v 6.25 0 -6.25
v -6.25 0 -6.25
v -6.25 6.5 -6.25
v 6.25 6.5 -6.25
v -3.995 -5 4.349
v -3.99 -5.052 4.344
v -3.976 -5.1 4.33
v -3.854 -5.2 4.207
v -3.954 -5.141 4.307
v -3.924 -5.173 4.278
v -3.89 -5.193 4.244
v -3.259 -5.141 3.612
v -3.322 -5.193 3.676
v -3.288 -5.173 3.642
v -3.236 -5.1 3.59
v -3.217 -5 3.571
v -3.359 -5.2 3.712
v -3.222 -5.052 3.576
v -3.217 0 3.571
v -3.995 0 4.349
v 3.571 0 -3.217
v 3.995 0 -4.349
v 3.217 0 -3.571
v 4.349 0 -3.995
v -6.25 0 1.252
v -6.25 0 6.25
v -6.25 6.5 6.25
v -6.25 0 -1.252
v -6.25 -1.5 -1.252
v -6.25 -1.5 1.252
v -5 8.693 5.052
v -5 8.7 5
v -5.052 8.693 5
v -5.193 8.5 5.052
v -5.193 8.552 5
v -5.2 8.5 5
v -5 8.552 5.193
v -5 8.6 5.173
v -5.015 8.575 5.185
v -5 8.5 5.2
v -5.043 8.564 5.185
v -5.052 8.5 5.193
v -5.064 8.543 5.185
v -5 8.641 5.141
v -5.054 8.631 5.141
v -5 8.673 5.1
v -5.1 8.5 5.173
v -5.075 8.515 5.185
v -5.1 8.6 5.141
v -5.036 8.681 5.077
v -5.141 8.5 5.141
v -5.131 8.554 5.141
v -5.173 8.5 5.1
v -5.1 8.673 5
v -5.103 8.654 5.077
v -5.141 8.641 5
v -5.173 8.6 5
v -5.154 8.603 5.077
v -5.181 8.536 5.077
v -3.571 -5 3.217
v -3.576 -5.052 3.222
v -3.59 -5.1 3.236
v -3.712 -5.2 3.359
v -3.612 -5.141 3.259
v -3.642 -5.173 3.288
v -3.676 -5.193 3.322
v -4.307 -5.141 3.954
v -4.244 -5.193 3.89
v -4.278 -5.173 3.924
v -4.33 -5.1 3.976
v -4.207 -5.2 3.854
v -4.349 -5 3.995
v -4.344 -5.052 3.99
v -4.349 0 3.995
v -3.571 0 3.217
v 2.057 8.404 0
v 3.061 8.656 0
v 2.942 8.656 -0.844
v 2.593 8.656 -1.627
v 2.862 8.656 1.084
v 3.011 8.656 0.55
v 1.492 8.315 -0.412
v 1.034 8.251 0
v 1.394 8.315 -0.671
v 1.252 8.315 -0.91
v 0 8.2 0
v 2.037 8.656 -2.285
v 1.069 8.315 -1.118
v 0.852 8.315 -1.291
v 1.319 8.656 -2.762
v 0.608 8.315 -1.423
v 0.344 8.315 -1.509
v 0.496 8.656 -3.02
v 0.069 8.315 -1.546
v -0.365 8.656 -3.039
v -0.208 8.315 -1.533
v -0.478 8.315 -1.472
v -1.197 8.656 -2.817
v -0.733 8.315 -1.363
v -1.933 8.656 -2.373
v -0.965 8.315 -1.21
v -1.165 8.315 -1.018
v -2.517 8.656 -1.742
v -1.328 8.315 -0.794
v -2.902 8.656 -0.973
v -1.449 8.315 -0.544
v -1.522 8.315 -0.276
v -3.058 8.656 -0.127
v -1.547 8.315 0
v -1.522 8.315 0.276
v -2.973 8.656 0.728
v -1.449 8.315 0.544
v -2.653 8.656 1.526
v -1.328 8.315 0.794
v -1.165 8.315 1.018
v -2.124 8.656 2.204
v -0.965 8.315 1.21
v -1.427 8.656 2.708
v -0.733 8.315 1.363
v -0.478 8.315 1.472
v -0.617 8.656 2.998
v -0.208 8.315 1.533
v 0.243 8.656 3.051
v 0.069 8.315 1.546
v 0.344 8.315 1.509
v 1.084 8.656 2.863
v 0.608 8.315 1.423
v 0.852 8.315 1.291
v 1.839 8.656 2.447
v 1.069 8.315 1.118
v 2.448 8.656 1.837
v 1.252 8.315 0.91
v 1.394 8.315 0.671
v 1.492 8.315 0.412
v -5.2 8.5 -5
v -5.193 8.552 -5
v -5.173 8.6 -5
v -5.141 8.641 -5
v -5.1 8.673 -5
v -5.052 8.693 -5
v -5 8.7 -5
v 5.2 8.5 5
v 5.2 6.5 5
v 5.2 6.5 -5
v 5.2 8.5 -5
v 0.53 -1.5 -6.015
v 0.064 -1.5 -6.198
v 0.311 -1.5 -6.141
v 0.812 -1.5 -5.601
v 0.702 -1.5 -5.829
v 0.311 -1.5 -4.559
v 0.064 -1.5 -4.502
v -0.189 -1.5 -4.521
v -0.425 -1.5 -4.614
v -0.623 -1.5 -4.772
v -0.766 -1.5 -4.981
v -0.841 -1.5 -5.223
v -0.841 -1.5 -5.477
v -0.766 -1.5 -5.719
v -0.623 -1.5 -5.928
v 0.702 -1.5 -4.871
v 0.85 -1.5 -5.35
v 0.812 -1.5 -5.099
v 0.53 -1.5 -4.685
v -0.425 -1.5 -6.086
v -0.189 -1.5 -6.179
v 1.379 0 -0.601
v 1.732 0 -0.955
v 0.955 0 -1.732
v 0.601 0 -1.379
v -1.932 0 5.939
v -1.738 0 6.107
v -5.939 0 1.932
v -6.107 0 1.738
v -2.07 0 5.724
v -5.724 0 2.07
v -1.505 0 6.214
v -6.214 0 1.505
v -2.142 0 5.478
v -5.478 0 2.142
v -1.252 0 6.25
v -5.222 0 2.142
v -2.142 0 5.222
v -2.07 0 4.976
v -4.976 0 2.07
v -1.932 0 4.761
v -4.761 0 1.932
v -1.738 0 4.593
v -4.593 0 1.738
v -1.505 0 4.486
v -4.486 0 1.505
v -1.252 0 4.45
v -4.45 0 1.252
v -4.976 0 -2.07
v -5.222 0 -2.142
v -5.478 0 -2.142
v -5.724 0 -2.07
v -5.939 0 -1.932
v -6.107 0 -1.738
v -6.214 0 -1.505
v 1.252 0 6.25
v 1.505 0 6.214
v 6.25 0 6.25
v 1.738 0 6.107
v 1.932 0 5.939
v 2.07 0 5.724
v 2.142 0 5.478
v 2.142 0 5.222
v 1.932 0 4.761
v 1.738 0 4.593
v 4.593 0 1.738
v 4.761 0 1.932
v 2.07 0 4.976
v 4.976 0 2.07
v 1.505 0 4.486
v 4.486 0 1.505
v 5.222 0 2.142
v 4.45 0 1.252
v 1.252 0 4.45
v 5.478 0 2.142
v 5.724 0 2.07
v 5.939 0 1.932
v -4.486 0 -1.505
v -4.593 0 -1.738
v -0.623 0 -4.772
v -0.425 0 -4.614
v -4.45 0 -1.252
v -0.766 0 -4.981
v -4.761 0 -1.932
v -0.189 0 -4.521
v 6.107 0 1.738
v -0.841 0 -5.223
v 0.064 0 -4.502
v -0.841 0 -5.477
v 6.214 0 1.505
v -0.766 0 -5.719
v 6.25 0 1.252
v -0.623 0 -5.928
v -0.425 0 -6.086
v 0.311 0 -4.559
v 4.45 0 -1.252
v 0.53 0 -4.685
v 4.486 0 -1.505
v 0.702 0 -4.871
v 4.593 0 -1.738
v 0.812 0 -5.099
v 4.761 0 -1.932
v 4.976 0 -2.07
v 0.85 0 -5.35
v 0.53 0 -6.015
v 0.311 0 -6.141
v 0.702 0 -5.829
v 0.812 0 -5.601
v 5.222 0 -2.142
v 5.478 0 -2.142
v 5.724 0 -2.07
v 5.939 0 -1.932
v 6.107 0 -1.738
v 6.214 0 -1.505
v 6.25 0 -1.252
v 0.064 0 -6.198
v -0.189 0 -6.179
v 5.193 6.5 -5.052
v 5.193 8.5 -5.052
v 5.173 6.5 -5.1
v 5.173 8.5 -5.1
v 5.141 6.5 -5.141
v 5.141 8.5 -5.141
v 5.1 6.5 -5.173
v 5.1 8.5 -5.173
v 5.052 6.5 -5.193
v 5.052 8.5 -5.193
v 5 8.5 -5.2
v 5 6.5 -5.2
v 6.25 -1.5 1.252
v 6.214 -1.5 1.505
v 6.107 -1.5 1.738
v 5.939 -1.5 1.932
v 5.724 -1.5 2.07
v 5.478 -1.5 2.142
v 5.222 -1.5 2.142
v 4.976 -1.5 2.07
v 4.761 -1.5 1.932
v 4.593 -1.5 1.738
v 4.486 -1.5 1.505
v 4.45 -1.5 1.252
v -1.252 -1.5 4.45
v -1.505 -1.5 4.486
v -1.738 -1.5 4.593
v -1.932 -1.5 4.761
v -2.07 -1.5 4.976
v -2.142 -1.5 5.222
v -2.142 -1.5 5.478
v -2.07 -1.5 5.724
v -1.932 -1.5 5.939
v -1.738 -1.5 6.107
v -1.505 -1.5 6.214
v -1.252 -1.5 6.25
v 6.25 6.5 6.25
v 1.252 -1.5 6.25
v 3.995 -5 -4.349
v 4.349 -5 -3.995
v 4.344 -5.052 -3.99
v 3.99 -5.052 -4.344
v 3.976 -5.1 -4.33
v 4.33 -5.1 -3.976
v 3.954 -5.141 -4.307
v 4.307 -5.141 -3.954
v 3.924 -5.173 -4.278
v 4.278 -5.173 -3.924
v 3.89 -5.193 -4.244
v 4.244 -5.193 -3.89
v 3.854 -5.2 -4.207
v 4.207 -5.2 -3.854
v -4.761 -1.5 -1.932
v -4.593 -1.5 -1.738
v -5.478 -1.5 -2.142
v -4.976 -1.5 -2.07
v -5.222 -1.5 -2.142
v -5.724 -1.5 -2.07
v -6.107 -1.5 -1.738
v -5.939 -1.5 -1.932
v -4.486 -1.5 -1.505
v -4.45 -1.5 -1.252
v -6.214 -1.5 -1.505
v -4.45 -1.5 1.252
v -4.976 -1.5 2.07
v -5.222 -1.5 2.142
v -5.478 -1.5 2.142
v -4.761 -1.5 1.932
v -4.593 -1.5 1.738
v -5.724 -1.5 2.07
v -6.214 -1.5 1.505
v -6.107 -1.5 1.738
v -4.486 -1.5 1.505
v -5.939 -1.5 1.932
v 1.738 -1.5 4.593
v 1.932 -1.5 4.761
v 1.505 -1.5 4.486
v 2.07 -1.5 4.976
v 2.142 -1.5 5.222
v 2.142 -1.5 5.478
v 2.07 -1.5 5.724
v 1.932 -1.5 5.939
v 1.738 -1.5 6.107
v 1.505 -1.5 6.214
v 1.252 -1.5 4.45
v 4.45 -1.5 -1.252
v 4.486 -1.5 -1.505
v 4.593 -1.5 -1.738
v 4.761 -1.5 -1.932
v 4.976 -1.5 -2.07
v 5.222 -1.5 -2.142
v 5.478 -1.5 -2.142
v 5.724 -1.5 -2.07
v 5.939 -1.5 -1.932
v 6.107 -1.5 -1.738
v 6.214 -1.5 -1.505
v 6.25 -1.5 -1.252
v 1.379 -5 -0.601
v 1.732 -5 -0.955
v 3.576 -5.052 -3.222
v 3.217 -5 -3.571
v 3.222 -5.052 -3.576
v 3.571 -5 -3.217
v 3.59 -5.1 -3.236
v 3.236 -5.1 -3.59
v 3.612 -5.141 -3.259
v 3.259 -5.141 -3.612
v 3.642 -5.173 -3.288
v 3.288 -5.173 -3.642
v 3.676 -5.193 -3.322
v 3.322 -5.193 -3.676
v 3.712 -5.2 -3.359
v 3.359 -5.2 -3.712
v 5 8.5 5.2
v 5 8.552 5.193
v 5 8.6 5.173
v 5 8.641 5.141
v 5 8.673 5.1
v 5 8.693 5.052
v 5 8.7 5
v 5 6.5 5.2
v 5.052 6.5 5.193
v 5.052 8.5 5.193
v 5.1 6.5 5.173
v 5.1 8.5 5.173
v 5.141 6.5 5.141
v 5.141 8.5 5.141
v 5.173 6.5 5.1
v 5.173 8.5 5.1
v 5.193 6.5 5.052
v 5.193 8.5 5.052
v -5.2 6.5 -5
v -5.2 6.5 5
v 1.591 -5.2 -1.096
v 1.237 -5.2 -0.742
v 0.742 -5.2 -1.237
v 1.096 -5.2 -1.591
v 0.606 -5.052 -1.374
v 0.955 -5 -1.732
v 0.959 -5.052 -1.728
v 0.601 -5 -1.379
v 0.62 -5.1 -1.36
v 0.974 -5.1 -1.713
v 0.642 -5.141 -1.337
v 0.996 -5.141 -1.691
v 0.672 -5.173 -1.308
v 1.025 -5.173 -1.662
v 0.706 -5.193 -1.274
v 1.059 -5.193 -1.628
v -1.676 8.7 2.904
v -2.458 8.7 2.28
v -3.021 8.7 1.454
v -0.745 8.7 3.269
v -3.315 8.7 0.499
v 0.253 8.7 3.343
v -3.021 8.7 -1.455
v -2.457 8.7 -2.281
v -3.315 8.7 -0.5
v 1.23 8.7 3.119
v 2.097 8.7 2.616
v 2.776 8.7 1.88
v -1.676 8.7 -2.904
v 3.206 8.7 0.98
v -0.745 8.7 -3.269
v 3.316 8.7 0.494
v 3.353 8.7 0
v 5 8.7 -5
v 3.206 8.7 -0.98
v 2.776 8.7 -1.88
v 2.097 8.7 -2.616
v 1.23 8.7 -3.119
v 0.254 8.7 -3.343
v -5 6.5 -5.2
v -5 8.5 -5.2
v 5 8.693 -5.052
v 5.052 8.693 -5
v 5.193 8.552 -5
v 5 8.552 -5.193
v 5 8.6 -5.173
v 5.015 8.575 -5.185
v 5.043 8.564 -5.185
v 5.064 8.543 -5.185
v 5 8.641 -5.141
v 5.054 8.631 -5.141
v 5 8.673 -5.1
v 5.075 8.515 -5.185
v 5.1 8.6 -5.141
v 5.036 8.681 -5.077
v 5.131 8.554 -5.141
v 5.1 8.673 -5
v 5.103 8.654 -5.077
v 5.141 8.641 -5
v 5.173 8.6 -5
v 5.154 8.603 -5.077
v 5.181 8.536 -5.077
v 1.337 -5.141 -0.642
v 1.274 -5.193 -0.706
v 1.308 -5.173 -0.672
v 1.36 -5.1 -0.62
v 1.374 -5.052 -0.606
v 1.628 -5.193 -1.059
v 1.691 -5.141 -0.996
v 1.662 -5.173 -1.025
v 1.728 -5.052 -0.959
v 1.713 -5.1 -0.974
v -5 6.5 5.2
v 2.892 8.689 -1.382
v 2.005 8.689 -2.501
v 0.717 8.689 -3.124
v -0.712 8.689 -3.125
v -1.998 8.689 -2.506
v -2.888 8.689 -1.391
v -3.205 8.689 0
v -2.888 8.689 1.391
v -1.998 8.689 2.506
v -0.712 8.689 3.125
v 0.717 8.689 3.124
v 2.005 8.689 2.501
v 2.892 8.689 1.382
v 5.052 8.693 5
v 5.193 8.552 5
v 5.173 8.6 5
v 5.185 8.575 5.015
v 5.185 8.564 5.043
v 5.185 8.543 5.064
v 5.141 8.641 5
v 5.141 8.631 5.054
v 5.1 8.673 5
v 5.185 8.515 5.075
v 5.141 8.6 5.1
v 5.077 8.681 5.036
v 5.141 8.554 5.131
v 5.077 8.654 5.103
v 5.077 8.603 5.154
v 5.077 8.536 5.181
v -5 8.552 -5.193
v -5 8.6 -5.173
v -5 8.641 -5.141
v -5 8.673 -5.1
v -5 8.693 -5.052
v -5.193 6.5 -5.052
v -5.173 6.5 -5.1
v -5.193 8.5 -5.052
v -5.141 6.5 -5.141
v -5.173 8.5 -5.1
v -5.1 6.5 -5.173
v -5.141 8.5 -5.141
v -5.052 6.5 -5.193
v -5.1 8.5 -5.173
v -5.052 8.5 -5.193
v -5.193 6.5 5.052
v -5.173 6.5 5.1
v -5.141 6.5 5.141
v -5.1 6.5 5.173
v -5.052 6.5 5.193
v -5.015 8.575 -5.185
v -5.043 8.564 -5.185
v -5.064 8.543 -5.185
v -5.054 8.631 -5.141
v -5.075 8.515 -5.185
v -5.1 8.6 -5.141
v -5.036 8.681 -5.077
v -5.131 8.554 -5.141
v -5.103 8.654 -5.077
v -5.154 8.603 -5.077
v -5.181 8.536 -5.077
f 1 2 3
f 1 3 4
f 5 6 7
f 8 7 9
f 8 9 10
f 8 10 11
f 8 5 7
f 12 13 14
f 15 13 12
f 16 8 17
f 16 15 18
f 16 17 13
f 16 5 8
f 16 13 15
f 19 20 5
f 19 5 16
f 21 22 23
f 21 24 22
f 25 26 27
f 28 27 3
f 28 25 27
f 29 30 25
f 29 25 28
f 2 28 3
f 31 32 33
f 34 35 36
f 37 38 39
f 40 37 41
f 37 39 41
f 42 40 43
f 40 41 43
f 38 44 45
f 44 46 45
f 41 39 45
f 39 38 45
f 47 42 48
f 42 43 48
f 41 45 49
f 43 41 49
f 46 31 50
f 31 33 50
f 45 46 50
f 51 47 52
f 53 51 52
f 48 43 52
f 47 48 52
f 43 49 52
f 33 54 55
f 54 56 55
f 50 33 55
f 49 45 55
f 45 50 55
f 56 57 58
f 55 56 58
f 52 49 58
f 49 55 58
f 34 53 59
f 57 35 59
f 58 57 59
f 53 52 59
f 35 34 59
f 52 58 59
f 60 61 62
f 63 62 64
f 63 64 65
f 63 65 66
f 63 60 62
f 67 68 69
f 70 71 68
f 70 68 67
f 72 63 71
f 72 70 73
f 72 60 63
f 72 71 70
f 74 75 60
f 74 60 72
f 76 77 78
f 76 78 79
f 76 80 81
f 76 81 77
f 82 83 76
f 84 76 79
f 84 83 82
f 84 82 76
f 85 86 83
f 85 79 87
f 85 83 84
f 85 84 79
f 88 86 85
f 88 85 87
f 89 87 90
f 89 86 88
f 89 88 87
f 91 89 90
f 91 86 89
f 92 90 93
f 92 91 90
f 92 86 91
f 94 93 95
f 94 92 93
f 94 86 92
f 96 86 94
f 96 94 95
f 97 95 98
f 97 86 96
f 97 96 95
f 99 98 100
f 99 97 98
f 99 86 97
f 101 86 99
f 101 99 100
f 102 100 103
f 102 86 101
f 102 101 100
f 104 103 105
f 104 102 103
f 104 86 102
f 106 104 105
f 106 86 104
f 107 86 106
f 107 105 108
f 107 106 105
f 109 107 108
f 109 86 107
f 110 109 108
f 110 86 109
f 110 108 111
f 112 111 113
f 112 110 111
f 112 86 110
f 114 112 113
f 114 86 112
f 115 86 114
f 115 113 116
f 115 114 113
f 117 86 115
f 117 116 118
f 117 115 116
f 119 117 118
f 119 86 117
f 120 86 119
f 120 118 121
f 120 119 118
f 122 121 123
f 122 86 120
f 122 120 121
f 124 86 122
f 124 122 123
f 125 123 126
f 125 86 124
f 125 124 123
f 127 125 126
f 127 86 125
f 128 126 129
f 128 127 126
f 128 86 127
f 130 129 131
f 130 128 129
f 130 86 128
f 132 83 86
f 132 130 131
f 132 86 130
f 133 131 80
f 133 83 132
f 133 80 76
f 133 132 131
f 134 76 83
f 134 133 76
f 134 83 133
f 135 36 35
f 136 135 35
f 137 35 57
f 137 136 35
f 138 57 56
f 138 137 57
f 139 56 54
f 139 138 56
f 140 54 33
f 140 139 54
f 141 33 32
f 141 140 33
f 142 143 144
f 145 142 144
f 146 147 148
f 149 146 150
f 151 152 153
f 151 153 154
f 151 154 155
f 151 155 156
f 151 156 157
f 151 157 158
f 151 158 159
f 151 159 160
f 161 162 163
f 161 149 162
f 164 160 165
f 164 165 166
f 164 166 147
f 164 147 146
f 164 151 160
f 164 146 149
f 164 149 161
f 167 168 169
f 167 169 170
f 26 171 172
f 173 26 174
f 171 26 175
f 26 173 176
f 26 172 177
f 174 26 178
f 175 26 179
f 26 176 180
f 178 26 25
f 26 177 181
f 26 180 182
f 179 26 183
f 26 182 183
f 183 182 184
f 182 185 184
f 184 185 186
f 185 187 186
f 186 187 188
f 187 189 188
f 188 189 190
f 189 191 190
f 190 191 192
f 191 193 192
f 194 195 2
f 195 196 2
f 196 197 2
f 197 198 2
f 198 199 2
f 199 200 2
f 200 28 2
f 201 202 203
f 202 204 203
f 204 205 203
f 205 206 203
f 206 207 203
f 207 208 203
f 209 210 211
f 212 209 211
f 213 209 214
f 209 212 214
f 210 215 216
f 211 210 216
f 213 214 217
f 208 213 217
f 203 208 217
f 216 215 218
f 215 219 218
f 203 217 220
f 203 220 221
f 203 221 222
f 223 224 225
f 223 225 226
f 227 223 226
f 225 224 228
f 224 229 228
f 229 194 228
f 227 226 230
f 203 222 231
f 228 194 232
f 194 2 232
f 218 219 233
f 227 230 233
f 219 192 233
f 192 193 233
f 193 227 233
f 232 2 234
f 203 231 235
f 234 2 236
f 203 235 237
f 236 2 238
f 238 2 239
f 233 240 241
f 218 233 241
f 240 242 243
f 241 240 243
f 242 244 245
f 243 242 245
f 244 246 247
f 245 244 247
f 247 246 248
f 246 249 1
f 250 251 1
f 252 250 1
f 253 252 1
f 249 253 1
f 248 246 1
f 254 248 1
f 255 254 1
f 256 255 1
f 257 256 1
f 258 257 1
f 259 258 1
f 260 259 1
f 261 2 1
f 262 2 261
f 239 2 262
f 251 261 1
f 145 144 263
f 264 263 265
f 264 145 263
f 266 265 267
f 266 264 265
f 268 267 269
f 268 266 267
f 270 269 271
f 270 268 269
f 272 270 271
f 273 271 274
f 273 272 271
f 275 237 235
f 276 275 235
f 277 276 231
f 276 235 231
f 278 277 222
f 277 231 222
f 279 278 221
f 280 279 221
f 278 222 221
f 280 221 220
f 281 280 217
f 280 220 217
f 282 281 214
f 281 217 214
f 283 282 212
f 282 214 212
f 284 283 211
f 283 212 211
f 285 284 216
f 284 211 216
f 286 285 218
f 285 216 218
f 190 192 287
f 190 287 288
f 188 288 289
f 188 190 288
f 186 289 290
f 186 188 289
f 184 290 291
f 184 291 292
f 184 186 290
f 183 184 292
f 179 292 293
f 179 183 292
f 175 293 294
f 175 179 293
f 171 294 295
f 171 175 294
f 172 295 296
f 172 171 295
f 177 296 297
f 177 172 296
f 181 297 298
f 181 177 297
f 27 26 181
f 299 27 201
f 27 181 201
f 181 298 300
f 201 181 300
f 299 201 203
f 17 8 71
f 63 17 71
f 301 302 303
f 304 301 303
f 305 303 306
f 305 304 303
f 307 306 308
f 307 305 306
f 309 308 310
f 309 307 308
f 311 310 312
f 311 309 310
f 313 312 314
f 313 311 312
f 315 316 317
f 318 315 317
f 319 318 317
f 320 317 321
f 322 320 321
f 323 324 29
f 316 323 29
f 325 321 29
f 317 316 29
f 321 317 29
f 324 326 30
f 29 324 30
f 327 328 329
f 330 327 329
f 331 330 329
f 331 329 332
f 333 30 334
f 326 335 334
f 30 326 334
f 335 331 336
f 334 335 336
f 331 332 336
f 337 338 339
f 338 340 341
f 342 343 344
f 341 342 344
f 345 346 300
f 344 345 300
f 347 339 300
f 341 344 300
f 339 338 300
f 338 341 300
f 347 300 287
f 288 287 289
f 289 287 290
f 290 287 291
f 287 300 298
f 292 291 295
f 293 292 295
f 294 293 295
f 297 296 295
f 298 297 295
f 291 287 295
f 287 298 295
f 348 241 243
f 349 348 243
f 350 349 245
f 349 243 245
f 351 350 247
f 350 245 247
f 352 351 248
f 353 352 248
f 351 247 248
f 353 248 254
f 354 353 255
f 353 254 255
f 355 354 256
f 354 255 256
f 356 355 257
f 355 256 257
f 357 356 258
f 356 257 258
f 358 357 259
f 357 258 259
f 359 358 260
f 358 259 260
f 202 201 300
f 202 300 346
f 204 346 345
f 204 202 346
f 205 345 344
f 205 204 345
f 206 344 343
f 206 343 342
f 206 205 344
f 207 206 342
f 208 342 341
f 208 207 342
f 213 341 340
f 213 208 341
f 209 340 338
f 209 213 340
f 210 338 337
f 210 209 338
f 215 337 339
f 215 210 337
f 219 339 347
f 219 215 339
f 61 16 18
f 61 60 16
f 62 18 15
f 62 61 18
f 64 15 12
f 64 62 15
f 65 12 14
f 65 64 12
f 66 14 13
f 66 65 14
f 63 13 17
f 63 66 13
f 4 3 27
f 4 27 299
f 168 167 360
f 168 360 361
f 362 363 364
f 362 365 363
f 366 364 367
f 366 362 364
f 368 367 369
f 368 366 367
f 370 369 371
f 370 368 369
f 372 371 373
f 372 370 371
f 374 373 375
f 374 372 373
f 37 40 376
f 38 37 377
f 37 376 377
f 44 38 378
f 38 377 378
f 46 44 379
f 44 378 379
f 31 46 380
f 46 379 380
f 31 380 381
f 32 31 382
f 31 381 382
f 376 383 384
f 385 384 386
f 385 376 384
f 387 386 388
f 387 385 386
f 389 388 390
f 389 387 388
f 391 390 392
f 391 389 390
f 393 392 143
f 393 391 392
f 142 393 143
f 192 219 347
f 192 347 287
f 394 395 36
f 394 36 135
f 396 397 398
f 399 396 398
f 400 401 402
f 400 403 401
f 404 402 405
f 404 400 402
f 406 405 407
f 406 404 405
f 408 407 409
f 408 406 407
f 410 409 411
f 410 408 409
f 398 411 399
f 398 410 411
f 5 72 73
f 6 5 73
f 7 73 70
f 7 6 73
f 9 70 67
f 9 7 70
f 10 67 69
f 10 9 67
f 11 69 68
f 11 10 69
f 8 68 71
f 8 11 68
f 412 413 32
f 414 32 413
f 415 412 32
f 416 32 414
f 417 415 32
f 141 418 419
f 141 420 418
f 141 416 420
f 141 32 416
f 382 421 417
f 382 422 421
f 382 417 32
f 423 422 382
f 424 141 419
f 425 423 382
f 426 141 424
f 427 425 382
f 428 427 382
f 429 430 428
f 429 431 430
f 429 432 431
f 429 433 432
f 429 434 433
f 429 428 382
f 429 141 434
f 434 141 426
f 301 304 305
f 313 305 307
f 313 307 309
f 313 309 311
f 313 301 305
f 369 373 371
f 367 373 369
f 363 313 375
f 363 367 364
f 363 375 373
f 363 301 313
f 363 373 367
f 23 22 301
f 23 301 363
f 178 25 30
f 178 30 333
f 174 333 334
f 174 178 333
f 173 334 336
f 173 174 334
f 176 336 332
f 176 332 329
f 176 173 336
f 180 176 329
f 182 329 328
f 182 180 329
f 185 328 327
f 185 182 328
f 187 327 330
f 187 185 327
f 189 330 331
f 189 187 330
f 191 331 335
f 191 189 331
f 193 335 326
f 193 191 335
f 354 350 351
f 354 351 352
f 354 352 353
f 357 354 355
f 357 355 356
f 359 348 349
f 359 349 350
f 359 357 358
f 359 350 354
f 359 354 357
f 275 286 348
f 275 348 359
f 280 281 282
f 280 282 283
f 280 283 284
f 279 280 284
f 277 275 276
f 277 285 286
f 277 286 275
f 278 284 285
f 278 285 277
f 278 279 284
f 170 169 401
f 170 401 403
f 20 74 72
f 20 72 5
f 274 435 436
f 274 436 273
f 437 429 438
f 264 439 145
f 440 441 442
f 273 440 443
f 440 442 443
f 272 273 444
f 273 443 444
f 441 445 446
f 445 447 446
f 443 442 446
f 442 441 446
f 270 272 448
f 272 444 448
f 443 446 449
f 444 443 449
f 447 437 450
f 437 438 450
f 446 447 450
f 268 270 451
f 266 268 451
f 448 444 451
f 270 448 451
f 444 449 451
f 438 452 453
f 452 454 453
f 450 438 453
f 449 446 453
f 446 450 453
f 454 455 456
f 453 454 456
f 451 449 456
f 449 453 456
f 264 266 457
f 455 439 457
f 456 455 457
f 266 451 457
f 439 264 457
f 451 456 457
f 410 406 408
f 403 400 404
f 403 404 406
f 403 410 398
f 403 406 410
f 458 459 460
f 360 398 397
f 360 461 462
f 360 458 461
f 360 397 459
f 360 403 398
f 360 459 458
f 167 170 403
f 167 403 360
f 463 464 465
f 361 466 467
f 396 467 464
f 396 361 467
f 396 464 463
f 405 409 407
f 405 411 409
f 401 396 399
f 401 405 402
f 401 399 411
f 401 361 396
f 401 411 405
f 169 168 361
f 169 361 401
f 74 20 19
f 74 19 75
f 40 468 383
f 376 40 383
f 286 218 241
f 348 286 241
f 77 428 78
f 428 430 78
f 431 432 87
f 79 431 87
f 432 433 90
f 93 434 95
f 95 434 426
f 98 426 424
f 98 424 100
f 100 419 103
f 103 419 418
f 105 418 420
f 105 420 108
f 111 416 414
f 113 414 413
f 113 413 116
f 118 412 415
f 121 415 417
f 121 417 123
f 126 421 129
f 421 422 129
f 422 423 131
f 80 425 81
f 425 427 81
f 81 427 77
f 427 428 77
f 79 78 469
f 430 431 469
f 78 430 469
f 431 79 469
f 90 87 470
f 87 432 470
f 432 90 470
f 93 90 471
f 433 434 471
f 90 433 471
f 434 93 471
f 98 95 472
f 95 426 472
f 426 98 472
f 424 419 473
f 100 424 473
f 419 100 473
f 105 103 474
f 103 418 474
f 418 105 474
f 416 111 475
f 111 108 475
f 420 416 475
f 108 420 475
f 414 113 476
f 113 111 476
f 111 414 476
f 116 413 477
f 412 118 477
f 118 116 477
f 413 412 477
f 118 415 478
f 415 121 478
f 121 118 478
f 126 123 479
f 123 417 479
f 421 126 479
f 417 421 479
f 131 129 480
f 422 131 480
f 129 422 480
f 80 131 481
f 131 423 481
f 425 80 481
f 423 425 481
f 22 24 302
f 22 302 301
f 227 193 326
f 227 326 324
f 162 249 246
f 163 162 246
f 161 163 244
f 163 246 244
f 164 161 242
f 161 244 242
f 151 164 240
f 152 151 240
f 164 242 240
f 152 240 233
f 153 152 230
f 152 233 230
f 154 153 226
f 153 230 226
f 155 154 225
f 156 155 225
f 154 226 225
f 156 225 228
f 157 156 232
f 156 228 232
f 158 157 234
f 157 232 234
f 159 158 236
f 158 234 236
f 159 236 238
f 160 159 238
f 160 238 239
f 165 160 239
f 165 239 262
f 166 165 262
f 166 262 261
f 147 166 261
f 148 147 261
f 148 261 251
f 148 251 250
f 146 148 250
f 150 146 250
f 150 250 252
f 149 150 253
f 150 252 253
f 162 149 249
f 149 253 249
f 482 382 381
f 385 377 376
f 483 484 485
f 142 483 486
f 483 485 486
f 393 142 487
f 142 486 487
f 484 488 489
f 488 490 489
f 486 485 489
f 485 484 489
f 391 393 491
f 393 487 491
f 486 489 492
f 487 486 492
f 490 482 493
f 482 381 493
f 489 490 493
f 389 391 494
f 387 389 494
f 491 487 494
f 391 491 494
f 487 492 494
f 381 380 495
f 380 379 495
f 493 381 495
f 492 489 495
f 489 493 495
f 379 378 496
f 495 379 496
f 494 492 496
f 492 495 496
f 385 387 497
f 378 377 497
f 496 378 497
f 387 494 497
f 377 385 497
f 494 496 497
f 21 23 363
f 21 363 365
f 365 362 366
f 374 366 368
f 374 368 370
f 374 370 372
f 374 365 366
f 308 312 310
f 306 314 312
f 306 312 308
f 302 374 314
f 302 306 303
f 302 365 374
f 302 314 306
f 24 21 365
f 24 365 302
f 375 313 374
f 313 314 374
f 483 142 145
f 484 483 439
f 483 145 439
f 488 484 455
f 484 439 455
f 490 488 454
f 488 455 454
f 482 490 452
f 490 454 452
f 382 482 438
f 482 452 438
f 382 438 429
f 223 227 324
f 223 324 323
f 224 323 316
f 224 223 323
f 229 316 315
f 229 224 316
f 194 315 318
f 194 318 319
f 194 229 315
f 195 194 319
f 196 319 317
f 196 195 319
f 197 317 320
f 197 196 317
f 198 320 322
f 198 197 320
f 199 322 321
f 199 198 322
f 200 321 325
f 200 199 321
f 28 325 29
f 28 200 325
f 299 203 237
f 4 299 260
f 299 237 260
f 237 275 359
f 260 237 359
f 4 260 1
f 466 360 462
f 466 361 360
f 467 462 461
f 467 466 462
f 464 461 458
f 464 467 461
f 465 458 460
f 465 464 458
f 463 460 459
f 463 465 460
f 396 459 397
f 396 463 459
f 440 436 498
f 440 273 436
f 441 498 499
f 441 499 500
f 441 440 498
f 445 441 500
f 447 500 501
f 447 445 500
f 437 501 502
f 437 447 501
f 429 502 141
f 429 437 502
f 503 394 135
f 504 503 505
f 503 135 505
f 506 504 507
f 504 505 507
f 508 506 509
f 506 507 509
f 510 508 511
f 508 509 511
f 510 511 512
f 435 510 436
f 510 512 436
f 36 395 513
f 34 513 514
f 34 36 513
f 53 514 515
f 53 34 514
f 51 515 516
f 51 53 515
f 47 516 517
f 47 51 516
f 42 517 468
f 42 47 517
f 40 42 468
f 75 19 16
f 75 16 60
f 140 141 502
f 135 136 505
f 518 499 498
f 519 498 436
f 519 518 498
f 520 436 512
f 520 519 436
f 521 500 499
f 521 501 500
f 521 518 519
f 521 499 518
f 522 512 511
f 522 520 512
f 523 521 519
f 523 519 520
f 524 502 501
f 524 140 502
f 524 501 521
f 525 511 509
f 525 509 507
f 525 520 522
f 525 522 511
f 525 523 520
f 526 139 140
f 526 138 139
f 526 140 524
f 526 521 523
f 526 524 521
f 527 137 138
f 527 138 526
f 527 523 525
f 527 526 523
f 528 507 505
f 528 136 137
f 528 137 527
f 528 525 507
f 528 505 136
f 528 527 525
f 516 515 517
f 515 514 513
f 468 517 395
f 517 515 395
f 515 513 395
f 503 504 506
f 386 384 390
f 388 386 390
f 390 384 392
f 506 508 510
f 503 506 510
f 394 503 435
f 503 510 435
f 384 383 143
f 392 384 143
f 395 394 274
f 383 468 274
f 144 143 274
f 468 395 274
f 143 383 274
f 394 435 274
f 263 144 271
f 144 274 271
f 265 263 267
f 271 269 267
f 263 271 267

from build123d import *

# Parameters (mm, degrees)
SKETCH_1_W        = 12.5
SKETCH_1_H        = 12.5
EXTRUDE_1_DEPTH   = 6.5
SKETCH_2_R        = 0.85
EXTRUDE_2_DEPTH   = 1.5
EXTRUDE_3_DEPTH   = 5.2
EXTRUDE_3_2_DEPTH = 5.2
EXTRUDE_3_3_DEPTH = 5.2
FILLET_2_R        = 0.2
FILLET_3_R        = 0.2
FILLET_4_R        = 0.2
SKETCH_6_W        = 10.4
SKETCH_6_H        = 10.4
EXTRUDE_4_DEPTH   = 2.2
FILLET_5_R        = 0.2
FILLET_6_R        = 1


with BuildPart() as part:
    # Эскиз1 → Бобышка-Вытянуть1 (new body)
    with BuildSketch(Plane(origin=(0, 0, 0), x_dir=(1, 0, 0), z_dir=(0, 1, 0))):
        Rectangle(SKETCH_1_W, SKETCH_1_H)
    extrude(amount=EXTRUDE_1_DEPTH)

    # Эскиз2 → Бобышка-Вытянуть2 (add)
    with BuildSketch(Plane.XZ):
        with Locations((0, -5.35)):
            Circle(SKETCH_2_R)
        with BuildLine():
            Line((-1.251544725, 6.25), (1.251544725, 6.25))
            ThreePointArc((1.251544725, 6.25), (2.151544725, 5.35), (1.251544725, 4.45))
            Line((1.251544725, 4.45), (-1.251544725, 4.45))
            ThreePointArc((-1.251544725, 4.45), (-2.151544725, 5.35), (-1.251544725, 6.25))
        make_face()
        with BuildLine():
            Line((6.25, -1.251544725), (6.25, 1.251544725))
            ThreePointArc((6.25, 1.251544725), (5.35, 2.151544725), (4.45, 1.251544725))
            Line((4.45, 1.251544725), (4.45, -1.251544725))
            ThreePointArc((4.45, -1.251544725), (5.35, -2.151544725), (6.25, -1.251544725))
        make_face()
        with BuildLine():
            Line((-6.25, -1.251544725), (-6.25, 1.251544725))
            ThreePointArc((-6.25, 1.251544725), (-5.35, 2.151544725), (-4.45, 1.251544725))
            Line((-4.45, 1.251544725), (-4.45, -1.251544725))
            ThreePointArc((-4.45, -1.251544725), (-5.35, -2.151544725), (-6.25, -1.251544725))
        make_face()
    extrude(amount=EXTRUDE_2_DEPTH)


with BuildPart() as body_2:
    # Эскиз5 → Бобышка-Вытянуть3 (new body)
    with BuildSketch(Plane.XZ):
        Polygon((-3.995153314, 4.348706704), (-3.217335854, 3.570889245), (-3.570889245, 3.217335854), (-4.348706704, 3.995153314), align=None)
    extrude(amount=EXTRUDE_3_DEPTH)

    # Скругление2
    fillet_2_edges = [body_2.edges().sort_by_distance(p)[0] for p in [
        (-4.171930009, -5.2, 4.171930009),
        (-3.39411255, -5.2, 3.39411255),
    ]]
    fillet(fillet_2_edges, radius=FILLET_2_R)


with BuildPart() as body_3:
    # Эскиз5 → Extrude 3 2 (new body)
    with BuildSketch(Plane.XZ):
        Polygon((3.995153314, -4.348706704), (3.217335854, -3.570889245), (3.570889245, -3.217335854), (4.348706704, -3.995153314), align=None)
    extrude(amount=EXTRUDE_3_2_DEPTH)

    # Скругление4
    fillet_4_edges = [body_3.edges().sort_by_distance(p)[0] for p in [
        (3.39411255, -5.2, -3.39411255),
        (4.171930009, -5.2, -4.171930009),
    ]]
    fillet(fillet_4_edges, radius=FILLET_4_R)


with BuildPart() as body_4:
    # Эскиз5 → Extrude 3 3 (new body)
    with BuildSketch(Plane.XZ):
        Polygon((0.601040764, -1.378858223), (1.378858223, -0.601040764), (1.732411614, -0.954594155), (0.954594155, -1.732411614), align=None)
    extrude(amount=EXTRUDE_3_3_DEPTH)

    # Скругление3
    fillet_3_edges = [body_4.edges().sort_by_distance(p)[0] for p in [
        (0.777817459, -5.2, -1.555634919),
        (1.555634919, -5.2, -0.777817459),
    ]]
    fillet(fillet_3_edges, radius=FILLET_3_R)


with BuildPart() as body_5:
    # Эскиз6 → Бобышка-Вытянуть4 (new body)
    with BuildSketch(Plane(origin=(0, 6.5, 0), x_dir=(1, 0, 0), z_dir=(0, 1, 0))):
        Rectangle(SKETCH_6_W, SKETCH_6_H)
    extrude(amount=EXTRUDE_4_DEPTH)

    # Скругление5
    fillet_5_edges = [body_5.edges().sort_by_distance(p)[0] for p in [
        (-5.2, 8.7, 0),
        (0, 8.7, 5.2),
        (5.2, 8.7, 0),
        (0, 8.7, -5.2),
        (5.2, 7.6, 5.2),
        (-5.2, 7.6, 5.2),
        (-5.2, 7.6, -5.2),
        (5.2, 7.6, -5.2),
    ]]
    fillet(fillet_5_edges, radius=FILLET_5_R)

    # Эскиз7 → Вырез-Повернуть1 (revolve, cut)
    with BuildSketch(Plane.XY):
        with BuildLine():
            Line((0, 8.7), (3.2, 8.7))
            ThreePointArc((3.2, 8.7), (1.619413474, 8.325753766), (0, 8.2))
            Line((0, 8.2), (0, 8.7))
        make_face()
    revolve(axis=Axis((0, 8.2, 0), (0, 1, 0)), mode=Mode.SUBTRACT)

    # Скругление6
    fillet_6_edges = [body_5.edges().sort_by_distance(p)[0] for p in [
        (-3.2, 8.7, 0),
    ]]
    fillet(fillet_6_edges, radius=FILLET_6_R)


solid = Compound([part.part, body_2.part, body_3.part, body_4.part, body_5.part])
